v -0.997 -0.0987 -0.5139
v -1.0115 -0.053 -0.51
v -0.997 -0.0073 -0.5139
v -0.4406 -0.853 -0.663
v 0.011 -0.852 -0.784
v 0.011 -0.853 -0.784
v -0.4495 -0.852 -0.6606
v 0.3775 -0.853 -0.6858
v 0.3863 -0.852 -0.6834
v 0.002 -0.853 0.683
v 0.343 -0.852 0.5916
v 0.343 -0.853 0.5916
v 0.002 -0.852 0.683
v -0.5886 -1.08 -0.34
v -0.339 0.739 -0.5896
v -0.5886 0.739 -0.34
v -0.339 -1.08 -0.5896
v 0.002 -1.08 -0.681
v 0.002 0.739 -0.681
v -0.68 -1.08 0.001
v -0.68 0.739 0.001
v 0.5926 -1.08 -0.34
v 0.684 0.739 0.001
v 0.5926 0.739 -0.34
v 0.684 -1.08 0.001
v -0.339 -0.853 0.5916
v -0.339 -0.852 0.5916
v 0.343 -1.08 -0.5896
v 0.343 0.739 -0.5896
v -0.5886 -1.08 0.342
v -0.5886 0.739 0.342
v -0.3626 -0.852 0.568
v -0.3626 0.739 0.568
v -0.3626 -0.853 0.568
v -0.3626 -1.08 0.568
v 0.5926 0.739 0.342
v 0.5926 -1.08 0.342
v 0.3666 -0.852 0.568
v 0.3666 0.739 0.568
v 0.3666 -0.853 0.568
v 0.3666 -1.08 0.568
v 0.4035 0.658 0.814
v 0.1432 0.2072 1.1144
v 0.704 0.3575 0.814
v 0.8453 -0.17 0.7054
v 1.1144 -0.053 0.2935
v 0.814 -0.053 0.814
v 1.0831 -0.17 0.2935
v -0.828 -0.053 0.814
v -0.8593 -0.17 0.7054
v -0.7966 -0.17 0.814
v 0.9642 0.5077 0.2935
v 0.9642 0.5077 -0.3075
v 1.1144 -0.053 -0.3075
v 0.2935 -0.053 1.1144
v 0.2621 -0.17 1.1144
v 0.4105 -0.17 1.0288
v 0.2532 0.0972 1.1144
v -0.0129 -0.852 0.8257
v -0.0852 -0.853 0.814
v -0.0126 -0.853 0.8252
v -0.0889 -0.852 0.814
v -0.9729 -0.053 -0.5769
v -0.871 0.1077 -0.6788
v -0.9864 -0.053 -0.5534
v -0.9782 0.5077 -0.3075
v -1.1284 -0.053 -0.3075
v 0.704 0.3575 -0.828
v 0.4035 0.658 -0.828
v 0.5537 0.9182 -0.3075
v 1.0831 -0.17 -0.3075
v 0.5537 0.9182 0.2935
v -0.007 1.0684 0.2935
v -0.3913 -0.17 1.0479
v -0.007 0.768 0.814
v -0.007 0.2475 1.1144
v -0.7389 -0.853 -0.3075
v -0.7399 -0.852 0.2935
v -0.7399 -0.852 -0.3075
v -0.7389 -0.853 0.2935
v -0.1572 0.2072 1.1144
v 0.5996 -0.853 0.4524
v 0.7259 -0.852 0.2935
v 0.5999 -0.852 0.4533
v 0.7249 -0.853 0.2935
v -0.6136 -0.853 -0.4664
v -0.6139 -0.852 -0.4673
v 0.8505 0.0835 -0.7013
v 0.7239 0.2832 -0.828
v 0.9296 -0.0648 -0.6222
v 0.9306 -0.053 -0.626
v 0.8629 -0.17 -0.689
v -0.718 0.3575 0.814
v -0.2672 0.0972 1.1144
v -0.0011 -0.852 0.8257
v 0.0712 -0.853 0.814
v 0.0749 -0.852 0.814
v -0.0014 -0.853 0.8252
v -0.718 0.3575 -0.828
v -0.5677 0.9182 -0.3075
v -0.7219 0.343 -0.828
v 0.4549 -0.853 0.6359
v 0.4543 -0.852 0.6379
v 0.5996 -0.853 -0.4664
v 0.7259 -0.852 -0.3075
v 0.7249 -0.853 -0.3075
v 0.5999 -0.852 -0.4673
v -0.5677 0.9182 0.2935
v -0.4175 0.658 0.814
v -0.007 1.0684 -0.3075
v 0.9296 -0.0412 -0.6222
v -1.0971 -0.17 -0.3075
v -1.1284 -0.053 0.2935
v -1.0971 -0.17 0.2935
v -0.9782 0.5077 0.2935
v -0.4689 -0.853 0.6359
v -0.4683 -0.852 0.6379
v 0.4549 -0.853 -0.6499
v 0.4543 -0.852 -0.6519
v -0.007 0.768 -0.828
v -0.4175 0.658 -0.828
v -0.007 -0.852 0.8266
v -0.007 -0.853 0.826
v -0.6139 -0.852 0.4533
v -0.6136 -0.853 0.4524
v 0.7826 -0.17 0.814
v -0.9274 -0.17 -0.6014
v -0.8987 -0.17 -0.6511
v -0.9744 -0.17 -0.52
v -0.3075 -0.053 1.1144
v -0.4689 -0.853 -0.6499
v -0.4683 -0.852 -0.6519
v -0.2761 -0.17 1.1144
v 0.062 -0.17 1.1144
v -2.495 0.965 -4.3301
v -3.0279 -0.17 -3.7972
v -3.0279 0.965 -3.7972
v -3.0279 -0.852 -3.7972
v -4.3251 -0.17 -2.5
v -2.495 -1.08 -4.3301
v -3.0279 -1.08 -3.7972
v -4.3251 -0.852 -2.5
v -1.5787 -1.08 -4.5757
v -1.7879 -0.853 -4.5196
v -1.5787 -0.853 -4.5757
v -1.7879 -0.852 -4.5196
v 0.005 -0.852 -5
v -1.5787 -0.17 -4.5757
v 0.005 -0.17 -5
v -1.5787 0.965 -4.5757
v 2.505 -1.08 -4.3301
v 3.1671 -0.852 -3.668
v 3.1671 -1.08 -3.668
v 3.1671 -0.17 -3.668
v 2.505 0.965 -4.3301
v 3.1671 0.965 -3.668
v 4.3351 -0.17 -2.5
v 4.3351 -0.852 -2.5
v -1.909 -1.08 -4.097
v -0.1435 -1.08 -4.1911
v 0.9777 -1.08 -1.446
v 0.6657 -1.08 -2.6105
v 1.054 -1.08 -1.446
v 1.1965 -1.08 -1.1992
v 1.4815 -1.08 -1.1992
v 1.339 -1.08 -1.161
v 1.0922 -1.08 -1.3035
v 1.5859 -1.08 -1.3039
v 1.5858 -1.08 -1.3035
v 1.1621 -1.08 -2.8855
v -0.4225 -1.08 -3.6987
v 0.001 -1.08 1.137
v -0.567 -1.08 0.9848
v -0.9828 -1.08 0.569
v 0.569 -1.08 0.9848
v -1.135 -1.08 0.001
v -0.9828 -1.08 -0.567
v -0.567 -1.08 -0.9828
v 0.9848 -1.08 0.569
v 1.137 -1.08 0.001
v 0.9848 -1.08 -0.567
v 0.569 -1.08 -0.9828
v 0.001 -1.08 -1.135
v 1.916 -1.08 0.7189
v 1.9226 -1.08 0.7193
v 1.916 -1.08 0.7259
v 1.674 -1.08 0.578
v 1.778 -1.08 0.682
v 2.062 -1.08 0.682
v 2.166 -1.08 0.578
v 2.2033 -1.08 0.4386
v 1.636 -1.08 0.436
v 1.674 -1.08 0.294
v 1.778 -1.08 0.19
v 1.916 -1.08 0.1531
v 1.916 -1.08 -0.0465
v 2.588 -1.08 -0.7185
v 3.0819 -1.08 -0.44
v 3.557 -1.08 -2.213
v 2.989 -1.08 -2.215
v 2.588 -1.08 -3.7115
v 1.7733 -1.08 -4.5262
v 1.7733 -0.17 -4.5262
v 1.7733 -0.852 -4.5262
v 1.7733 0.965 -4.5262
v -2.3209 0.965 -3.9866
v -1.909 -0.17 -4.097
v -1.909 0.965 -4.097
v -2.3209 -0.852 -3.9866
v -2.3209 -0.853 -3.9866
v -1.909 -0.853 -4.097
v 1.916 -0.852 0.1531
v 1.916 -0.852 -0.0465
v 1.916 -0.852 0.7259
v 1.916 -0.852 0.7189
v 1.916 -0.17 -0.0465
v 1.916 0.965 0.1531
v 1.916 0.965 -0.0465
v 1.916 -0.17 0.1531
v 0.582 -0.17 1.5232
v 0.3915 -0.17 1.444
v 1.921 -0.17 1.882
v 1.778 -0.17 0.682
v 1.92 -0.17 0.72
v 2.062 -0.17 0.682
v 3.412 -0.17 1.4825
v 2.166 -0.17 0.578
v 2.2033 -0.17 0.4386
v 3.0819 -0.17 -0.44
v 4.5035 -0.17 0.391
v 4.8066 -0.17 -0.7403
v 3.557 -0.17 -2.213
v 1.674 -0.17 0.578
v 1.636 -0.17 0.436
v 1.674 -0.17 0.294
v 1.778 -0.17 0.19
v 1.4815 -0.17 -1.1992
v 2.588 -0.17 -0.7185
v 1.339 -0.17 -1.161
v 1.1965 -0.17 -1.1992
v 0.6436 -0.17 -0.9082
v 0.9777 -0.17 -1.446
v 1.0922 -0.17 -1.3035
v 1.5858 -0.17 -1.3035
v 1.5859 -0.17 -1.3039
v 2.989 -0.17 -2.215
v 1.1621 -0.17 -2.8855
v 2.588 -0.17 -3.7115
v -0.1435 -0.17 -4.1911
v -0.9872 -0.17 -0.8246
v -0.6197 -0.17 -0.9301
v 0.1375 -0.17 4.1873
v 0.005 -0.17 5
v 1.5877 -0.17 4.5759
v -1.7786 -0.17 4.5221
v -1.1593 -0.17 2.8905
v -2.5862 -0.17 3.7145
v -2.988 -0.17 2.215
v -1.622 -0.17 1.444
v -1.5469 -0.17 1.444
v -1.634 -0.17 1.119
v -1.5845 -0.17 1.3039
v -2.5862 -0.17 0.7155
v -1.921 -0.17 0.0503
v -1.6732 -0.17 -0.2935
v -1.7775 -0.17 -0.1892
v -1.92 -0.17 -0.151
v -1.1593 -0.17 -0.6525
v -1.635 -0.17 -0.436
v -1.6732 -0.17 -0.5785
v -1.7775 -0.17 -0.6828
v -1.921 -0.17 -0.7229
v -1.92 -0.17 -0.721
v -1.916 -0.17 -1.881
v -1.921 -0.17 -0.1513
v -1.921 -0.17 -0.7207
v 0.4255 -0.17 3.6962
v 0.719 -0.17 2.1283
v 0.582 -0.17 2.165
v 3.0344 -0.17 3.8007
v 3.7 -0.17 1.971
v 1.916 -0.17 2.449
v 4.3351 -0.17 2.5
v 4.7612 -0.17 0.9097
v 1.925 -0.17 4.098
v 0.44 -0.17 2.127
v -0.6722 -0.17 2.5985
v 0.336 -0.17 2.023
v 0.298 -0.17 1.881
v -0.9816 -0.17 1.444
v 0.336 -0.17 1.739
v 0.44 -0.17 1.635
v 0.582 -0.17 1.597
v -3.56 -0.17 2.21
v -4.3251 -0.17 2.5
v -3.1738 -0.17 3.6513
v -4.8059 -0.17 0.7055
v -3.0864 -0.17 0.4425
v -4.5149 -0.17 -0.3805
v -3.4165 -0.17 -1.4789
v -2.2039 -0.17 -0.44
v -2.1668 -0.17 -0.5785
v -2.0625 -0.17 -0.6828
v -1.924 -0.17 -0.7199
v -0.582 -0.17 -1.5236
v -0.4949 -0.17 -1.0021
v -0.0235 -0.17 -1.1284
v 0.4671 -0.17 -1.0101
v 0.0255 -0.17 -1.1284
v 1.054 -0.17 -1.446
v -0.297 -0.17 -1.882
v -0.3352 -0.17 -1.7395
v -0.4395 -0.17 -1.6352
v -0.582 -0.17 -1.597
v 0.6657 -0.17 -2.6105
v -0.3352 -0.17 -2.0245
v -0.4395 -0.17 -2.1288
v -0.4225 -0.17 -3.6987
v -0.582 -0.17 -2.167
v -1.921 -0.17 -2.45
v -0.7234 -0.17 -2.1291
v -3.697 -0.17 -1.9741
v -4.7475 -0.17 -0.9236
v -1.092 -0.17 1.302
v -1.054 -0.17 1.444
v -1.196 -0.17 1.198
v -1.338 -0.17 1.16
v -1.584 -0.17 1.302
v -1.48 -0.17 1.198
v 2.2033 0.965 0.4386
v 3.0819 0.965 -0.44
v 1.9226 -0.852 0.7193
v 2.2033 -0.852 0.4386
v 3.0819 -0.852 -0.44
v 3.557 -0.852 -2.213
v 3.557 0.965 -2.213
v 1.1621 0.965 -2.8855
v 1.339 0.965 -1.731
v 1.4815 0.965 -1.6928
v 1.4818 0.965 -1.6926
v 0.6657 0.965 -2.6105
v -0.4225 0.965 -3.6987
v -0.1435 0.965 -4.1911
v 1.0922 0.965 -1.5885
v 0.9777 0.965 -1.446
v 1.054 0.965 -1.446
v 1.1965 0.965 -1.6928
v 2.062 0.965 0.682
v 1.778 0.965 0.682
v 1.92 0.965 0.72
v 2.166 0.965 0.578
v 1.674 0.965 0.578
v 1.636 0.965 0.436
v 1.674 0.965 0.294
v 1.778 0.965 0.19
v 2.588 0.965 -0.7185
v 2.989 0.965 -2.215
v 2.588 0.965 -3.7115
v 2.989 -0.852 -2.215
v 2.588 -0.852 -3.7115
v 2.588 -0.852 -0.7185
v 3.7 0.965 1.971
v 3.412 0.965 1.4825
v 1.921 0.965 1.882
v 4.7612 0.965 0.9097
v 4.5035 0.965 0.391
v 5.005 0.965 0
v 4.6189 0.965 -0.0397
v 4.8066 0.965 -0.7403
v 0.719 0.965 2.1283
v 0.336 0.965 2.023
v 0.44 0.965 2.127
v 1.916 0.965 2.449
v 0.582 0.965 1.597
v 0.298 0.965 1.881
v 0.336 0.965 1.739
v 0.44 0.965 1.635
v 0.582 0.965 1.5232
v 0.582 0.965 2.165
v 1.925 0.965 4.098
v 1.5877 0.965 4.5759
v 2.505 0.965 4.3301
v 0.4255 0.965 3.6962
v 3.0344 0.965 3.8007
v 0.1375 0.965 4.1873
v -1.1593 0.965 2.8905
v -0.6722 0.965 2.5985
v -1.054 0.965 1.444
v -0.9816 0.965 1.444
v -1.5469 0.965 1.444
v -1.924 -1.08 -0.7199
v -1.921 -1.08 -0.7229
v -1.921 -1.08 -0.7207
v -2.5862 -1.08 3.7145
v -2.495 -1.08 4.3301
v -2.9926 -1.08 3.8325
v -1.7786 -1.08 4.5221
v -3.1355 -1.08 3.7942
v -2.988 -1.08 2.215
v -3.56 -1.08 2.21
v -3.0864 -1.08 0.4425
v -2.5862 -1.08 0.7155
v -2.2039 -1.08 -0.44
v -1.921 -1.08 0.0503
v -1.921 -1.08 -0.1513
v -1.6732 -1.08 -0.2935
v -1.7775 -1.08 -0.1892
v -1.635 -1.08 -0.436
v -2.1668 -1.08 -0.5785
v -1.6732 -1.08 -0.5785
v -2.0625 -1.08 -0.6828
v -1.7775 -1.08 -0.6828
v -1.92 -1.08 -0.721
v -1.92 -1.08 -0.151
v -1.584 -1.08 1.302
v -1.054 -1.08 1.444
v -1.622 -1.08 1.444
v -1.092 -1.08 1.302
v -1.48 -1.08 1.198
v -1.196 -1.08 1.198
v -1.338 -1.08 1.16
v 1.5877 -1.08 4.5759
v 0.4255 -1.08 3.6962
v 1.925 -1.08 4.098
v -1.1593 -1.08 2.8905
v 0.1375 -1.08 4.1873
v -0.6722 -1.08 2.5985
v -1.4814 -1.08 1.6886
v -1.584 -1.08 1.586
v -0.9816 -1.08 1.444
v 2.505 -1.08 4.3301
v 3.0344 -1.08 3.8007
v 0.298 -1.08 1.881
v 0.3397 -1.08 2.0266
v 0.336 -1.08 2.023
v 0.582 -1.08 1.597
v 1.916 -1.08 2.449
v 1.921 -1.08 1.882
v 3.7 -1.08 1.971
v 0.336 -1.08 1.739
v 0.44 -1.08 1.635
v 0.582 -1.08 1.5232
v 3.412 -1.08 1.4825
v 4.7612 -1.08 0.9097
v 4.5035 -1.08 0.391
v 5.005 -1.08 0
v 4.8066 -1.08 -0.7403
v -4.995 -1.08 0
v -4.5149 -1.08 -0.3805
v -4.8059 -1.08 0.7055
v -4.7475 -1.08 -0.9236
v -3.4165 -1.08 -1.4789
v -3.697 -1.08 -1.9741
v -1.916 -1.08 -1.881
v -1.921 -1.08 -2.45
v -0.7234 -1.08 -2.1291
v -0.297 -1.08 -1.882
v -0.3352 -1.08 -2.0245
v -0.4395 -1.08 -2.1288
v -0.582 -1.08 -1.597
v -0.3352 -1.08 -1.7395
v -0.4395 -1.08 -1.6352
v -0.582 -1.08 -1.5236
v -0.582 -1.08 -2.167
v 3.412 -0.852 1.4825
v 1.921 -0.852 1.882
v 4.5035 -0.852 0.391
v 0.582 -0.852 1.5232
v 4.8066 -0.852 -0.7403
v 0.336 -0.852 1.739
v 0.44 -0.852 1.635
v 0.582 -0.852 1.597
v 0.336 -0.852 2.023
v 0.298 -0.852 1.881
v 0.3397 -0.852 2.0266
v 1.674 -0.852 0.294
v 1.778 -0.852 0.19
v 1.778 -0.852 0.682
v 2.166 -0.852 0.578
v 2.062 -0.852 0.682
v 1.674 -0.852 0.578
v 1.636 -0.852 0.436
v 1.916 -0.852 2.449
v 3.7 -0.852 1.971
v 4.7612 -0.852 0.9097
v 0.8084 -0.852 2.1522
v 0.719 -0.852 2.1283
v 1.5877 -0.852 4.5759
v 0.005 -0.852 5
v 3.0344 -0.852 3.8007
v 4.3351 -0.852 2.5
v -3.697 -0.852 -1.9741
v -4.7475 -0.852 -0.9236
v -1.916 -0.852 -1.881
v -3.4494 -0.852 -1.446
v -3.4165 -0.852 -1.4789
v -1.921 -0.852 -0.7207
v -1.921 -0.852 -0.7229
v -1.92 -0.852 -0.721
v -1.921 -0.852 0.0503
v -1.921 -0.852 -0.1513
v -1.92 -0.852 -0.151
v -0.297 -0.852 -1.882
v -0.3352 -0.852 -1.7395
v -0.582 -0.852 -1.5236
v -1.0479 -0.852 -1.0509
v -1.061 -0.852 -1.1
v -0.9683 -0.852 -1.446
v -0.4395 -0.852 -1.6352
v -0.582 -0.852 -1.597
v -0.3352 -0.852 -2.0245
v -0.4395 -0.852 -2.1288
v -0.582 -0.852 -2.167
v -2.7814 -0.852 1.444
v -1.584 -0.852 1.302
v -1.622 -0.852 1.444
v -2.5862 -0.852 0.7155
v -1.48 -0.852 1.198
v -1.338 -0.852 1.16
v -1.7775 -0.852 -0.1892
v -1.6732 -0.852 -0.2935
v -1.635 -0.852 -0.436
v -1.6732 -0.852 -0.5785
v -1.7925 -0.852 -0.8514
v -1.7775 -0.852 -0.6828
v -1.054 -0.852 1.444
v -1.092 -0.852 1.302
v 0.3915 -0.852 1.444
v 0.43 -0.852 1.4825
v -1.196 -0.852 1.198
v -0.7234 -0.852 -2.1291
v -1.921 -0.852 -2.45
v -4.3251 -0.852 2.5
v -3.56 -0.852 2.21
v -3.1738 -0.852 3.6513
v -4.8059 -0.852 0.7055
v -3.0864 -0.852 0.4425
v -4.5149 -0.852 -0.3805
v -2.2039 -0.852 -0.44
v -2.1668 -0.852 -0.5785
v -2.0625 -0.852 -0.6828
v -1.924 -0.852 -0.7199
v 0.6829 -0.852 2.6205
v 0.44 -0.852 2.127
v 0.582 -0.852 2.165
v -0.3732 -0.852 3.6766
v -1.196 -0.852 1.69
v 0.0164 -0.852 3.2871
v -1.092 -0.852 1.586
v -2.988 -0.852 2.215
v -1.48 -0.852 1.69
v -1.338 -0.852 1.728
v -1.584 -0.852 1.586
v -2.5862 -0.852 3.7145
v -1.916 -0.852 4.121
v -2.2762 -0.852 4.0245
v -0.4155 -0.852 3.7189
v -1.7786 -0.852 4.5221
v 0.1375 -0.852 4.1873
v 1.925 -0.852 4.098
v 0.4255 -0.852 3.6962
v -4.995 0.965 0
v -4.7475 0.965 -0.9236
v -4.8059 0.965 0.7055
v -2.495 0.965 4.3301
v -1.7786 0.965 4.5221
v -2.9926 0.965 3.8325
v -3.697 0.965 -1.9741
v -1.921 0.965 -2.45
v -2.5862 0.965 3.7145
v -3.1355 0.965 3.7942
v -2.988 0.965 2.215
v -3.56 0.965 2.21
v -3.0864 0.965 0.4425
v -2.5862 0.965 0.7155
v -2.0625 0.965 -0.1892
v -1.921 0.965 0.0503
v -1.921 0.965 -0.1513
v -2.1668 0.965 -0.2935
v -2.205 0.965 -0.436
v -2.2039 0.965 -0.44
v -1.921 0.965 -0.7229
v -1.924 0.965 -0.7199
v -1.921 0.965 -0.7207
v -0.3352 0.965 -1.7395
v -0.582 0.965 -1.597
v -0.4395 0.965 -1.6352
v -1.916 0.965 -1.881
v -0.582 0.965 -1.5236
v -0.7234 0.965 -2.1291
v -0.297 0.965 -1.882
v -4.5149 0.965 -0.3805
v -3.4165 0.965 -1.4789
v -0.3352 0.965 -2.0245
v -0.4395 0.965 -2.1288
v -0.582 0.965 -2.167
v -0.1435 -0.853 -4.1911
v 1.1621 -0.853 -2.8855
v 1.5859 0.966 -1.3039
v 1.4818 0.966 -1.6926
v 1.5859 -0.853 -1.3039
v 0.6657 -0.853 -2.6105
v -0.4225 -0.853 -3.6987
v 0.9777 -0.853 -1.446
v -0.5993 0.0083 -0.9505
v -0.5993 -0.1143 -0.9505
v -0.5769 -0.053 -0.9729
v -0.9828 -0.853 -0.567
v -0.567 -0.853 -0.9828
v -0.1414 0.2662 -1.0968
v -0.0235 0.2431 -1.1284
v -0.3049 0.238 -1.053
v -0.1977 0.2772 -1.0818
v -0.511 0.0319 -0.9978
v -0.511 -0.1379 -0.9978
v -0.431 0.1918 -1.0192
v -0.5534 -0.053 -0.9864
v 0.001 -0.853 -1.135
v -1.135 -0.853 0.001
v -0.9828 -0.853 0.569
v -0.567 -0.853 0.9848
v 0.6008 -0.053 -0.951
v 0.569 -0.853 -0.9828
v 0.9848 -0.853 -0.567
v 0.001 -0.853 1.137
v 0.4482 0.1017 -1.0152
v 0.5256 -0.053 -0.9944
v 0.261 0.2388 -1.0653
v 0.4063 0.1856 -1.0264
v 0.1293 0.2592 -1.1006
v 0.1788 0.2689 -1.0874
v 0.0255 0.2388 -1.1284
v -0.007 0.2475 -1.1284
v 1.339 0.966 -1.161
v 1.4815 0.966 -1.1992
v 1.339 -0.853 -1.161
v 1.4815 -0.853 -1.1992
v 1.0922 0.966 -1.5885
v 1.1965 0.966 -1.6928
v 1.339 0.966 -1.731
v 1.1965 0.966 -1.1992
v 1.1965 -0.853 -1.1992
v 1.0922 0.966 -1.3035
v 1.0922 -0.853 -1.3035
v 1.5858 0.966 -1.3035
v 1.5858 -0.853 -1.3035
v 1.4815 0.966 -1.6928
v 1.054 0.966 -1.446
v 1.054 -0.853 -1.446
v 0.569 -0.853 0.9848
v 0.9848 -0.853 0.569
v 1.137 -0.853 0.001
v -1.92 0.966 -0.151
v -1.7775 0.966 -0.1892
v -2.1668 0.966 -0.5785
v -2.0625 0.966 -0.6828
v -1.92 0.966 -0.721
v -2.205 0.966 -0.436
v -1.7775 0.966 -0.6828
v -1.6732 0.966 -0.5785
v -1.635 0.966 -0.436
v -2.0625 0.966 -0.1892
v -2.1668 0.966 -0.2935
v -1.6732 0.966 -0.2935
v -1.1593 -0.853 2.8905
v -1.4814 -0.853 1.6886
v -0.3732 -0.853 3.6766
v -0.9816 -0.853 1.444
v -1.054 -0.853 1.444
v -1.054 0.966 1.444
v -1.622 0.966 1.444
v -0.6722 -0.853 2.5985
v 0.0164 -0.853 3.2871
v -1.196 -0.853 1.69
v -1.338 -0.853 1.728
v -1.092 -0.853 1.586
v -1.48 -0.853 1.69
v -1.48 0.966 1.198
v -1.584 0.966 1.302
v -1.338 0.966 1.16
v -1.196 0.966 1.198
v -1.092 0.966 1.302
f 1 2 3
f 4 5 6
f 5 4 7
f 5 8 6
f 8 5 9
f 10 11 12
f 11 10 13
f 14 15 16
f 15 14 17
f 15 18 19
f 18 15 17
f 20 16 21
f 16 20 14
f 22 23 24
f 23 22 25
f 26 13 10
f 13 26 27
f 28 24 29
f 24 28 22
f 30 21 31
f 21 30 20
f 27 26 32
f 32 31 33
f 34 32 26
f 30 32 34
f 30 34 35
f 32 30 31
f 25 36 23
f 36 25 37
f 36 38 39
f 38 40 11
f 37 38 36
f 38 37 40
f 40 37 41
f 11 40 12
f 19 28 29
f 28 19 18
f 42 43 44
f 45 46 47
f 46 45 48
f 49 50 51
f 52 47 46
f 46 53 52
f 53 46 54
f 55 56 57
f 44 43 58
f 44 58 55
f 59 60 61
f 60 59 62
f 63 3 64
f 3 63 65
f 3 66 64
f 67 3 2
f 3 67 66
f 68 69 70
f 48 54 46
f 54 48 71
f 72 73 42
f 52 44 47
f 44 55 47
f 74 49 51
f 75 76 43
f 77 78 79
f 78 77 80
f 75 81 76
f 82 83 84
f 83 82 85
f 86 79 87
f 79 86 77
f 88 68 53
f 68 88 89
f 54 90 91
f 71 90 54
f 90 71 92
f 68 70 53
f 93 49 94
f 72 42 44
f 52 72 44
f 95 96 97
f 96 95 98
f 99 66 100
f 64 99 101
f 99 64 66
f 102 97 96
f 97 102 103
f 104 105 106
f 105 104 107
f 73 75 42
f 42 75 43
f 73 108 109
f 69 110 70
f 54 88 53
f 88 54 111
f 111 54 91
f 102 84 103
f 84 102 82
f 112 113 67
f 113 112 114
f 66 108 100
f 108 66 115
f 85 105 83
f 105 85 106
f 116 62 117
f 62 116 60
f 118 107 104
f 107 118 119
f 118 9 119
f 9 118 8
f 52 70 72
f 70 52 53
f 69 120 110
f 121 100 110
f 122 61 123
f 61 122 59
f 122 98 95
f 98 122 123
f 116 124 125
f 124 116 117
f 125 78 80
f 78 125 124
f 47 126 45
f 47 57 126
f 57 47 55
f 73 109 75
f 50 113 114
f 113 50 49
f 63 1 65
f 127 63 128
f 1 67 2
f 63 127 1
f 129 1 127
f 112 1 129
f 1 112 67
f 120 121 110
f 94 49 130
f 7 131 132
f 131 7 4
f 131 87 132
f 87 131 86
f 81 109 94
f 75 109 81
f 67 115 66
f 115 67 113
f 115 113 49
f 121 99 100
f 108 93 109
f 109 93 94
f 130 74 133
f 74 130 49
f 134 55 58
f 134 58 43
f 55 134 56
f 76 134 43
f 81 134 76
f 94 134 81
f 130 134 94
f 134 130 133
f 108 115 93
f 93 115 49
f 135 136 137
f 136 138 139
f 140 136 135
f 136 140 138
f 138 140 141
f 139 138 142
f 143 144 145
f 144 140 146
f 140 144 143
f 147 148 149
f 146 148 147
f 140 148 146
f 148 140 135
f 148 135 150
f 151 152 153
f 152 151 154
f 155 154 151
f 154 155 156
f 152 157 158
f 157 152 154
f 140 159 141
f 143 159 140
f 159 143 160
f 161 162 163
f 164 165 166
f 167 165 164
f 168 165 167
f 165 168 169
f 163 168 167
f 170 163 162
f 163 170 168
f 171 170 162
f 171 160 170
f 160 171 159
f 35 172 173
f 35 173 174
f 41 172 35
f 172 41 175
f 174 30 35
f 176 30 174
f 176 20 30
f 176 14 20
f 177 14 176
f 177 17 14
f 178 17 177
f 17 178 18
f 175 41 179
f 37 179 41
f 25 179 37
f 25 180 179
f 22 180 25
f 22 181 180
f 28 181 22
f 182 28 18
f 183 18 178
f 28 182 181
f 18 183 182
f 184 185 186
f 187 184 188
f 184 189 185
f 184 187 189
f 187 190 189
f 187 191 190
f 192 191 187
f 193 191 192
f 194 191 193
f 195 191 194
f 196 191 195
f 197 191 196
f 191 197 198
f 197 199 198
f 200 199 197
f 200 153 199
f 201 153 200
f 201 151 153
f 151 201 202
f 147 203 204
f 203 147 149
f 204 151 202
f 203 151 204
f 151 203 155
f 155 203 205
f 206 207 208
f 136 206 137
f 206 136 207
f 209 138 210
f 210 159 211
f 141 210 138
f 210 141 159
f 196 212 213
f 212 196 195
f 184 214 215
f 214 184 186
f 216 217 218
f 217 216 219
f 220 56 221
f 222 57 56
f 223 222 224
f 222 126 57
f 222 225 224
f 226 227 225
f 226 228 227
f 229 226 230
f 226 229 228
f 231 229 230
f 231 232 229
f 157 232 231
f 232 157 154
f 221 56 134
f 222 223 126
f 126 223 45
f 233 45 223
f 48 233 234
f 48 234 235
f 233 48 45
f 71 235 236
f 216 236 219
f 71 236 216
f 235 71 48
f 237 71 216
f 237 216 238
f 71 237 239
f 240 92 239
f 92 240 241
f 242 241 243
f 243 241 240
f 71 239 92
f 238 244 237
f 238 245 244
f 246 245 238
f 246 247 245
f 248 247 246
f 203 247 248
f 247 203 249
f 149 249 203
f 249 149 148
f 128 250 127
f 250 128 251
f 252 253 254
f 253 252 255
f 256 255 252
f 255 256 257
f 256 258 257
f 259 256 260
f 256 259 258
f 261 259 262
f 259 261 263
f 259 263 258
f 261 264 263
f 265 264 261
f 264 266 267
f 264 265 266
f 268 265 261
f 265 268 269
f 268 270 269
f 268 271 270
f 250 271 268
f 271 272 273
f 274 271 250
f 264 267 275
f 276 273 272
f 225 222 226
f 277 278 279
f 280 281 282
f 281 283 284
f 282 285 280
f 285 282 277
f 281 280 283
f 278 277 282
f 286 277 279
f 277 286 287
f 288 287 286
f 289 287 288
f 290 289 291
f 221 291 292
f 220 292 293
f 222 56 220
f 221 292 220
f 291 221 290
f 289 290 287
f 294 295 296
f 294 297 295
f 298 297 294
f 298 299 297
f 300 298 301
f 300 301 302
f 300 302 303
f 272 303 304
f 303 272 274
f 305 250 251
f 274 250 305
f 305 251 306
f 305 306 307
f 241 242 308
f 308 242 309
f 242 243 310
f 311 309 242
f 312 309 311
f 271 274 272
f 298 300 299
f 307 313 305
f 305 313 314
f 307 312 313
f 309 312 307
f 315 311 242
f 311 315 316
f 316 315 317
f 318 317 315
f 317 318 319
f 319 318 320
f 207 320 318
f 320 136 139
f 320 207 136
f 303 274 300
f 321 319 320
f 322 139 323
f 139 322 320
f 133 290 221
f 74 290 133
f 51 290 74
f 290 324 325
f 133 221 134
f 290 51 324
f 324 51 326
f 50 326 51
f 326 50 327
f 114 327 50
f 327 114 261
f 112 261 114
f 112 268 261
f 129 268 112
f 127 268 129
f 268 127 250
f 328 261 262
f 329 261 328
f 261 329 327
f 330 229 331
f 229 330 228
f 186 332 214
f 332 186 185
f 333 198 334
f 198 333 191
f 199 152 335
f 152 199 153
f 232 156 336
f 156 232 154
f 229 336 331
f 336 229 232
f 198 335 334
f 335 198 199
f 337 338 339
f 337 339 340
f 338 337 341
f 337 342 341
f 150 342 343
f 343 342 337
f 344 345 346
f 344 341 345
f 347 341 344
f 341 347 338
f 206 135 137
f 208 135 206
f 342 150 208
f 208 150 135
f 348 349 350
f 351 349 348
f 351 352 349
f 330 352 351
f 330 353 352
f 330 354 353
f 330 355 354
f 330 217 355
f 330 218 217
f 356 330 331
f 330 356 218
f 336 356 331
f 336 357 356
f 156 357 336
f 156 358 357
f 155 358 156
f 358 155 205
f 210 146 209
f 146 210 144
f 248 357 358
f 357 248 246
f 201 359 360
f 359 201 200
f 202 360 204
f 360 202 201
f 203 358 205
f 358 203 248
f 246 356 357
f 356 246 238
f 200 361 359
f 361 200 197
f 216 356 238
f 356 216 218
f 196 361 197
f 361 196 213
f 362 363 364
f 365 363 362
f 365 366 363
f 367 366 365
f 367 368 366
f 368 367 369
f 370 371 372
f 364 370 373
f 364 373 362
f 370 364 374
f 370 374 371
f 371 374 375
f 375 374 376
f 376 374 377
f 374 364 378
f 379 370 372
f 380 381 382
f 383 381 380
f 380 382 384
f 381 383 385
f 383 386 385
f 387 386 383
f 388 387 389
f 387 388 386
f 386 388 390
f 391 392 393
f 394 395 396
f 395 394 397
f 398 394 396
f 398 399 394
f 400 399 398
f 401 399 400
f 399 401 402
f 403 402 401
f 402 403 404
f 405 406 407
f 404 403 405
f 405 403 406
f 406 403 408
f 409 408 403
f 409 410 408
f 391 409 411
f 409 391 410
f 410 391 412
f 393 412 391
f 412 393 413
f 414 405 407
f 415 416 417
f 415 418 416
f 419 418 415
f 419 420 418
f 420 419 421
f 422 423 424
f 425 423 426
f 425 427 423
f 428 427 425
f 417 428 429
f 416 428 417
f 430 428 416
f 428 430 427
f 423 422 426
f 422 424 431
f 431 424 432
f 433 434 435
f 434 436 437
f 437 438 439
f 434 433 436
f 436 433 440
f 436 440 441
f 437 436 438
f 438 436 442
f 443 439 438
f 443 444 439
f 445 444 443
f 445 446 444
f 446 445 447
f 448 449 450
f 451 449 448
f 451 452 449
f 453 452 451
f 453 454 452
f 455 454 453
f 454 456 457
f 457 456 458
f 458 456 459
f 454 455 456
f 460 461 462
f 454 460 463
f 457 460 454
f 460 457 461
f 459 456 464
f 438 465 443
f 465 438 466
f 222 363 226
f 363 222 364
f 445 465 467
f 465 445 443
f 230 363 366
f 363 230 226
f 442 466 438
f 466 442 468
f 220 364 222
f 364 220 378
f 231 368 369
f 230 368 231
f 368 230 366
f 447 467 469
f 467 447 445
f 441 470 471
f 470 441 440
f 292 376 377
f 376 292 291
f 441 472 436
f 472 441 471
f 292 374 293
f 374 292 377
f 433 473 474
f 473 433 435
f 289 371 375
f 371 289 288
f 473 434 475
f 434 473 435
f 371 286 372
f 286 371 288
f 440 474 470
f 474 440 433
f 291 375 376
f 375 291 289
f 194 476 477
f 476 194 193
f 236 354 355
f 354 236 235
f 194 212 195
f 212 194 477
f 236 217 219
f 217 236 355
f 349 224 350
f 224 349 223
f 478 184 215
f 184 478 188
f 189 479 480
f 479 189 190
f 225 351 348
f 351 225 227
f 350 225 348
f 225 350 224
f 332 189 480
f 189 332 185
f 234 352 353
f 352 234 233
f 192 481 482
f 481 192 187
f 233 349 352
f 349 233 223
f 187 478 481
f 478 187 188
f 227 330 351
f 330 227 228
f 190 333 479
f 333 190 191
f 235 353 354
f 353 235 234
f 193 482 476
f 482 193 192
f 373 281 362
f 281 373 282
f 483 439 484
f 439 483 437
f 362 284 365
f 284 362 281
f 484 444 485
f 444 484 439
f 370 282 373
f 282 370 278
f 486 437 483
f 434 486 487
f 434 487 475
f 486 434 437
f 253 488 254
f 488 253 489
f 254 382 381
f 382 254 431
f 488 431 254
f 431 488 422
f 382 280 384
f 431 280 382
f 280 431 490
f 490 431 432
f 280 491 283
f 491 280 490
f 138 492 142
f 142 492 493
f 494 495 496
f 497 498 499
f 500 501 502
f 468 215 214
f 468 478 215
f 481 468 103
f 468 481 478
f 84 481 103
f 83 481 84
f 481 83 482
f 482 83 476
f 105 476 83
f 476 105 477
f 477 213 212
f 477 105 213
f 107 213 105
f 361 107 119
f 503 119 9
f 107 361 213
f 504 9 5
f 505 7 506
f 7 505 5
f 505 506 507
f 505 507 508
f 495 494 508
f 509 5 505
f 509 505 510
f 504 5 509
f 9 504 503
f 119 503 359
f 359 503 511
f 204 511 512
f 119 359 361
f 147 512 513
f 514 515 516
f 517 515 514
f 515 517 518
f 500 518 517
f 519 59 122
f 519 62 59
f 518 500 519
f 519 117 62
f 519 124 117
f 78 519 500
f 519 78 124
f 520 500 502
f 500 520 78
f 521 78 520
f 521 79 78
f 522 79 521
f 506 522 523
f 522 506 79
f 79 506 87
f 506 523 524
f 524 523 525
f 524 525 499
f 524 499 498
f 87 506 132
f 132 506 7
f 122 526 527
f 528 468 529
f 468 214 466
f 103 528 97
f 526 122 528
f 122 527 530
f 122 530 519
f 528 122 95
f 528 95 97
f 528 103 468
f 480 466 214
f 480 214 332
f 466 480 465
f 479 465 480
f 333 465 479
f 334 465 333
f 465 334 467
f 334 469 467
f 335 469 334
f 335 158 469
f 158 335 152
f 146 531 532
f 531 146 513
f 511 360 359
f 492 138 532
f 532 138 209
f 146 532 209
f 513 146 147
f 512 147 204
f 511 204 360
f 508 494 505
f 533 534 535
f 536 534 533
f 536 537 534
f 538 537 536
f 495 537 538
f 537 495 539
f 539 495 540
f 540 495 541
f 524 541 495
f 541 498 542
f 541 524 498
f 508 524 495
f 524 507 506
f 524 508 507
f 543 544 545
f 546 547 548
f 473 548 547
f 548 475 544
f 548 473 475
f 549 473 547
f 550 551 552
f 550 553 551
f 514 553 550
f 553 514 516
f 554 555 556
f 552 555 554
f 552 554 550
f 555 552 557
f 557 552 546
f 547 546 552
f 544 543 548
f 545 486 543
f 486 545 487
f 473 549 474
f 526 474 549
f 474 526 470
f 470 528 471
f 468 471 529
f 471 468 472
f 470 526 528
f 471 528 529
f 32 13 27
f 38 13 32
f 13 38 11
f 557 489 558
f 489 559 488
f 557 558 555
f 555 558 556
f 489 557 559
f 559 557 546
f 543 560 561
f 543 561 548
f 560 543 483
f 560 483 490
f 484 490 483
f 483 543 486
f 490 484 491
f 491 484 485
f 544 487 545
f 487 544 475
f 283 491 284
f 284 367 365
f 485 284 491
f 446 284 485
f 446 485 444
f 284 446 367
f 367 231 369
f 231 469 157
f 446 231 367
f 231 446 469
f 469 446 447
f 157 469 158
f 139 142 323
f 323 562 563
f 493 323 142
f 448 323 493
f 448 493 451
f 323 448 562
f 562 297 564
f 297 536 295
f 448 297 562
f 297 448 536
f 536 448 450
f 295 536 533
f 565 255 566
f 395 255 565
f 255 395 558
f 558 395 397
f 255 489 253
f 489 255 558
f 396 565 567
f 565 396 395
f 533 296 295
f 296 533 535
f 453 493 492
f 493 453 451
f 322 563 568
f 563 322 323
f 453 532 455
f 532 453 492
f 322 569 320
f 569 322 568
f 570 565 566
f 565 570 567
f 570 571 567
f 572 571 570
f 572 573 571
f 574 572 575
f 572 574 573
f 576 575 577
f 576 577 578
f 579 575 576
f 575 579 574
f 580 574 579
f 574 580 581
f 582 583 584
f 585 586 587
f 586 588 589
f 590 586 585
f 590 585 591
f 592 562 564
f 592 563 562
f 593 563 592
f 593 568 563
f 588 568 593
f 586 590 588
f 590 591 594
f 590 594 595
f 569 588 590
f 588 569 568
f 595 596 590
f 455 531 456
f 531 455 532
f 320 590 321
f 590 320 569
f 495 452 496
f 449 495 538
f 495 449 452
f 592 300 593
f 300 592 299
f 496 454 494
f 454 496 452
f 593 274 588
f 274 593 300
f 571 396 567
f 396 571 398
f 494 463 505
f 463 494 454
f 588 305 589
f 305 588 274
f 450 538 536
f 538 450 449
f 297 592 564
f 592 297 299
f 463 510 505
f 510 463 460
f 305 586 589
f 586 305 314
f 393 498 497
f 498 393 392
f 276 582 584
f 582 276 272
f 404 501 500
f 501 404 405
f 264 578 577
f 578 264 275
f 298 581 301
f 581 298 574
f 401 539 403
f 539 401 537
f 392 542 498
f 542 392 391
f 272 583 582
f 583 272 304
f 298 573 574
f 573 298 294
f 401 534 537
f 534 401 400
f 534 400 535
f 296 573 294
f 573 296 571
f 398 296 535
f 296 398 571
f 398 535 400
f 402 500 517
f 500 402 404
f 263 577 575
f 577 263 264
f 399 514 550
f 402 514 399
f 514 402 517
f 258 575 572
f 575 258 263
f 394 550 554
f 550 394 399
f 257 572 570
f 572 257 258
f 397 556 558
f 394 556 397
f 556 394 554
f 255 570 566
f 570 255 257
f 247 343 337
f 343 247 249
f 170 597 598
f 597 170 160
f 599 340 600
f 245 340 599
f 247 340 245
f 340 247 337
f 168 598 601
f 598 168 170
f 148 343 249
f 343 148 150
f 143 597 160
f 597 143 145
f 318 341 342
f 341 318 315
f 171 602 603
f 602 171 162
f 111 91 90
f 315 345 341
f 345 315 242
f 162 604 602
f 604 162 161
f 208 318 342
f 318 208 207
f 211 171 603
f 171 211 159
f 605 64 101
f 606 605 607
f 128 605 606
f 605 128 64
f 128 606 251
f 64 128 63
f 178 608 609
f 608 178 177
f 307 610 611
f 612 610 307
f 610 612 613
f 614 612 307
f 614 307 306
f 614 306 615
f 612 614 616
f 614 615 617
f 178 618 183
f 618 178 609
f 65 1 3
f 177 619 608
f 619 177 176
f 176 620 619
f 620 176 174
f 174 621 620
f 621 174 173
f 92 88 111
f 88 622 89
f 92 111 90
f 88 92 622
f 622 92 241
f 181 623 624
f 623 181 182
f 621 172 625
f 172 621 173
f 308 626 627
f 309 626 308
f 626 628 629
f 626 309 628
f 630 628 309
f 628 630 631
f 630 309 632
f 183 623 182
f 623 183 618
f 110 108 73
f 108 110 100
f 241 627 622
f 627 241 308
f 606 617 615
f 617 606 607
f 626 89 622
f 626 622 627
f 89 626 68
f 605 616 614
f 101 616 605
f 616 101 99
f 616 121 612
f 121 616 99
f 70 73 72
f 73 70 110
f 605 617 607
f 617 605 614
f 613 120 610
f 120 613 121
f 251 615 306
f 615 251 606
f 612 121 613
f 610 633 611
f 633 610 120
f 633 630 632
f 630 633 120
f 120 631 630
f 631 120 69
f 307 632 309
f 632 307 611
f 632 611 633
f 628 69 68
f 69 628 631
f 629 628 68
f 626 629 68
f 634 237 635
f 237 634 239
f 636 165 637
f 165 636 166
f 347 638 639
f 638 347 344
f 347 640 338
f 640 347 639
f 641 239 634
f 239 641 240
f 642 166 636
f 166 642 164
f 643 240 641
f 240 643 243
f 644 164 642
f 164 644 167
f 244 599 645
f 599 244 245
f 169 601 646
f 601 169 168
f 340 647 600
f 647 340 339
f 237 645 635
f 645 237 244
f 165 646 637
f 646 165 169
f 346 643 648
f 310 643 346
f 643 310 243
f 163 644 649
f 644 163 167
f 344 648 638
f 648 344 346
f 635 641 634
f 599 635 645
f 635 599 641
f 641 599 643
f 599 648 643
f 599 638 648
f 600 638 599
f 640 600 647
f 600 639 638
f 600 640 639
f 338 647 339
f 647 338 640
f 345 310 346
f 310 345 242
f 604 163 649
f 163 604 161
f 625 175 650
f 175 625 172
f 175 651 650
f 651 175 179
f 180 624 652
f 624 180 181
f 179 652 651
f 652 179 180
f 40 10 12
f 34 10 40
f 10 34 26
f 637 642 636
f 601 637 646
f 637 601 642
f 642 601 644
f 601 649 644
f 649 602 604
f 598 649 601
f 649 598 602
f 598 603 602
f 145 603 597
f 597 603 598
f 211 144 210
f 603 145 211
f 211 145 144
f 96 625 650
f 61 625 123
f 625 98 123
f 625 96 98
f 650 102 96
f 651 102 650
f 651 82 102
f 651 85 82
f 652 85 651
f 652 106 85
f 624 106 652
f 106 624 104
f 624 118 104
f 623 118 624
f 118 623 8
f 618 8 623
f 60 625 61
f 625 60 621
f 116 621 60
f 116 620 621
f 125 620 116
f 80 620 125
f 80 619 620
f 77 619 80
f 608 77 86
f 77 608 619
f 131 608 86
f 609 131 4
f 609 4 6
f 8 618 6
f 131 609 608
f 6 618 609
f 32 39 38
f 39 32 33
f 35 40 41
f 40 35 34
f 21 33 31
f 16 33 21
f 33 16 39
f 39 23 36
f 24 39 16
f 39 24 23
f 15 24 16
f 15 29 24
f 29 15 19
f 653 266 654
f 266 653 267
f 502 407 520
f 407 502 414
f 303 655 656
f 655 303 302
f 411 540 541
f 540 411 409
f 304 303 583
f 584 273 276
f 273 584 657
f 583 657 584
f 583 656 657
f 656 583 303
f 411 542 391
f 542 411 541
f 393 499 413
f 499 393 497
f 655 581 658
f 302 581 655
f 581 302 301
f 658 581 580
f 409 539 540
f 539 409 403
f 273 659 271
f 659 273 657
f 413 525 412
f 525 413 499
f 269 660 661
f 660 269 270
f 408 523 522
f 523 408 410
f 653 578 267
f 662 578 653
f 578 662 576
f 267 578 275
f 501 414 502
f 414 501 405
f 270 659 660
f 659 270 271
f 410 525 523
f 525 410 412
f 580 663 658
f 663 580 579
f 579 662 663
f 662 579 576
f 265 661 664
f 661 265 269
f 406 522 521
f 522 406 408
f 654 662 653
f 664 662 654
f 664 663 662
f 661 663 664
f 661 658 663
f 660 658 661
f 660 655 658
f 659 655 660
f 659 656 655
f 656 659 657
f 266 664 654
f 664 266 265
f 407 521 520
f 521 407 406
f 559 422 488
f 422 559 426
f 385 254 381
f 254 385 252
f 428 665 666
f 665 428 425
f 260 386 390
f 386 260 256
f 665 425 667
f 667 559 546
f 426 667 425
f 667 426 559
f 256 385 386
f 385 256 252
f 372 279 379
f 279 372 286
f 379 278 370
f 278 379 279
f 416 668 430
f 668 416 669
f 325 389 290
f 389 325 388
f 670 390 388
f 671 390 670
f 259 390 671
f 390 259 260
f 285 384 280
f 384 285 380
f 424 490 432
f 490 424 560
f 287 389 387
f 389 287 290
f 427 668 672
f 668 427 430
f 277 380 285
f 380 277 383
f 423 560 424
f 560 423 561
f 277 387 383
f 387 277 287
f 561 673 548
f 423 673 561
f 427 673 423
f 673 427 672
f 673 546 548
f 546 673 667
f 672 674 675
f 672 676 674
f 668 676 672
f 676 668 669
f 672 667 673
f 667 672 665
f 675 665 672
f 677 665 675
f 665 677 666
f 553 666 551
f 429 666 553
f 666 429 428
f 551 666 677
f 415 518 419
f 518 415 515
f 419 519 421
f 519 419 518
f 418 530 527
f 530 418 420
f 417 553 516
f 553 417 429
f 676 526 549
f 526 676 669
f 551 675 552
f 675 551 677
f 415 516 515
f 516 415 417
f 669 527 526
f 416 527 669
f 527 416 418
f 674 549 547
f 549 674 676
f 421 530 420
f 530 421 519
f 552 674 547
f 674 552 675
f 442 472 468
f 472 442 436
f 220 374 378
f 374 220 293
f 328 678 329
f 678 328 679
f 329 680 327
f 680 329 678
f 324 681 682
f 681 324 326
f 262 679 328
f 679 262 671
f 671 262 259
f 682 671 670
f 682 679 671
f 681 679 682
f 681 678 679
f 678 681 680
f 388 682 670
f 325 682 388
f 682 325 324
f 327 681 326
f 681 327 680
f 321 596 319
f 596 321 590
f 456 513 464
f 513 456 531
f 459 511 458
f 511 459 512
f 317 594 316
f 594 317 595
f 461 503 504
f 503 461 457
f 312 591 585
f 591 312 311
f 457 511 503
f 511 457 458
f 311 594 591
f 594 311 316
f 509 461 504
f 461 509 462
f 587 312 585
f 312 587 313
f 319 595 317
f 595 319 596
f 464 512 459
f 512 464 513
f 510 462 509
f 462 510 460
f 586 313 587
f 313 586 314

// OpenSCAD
intersection() {
translate([-6, -1.295, -6]) cube(size = [12, 2.591, 12], center = false);
union() {
intersection() {
difference() {
rotate([180, 90, -90])
translate([-2.215, -0.011, -18.1])
cylinder(h = 36.2, r1 = 2.999, r2 = 2.999, center = false, $fn = 12);
rotate([180, 90, -90])
translate([-0.001, -0.002, -18.1])
cylinder(h = 36.2, r1 = 0.682, r2 = 0.682, center = false, $fn = 12);
}
difference() {
translate([-0.007, -0.053, -0.007]) sphere(r = 1.161, $fn = 12);
rotate([180, 90, -90])
translate([-0.001, -0.002, -18.1])
cylinder(h = 36.2, r1 = 0.682, r2 = 0.682, center = false, $fn = 12);
}
}
difference() {
difference() {
difference() {
rotate([180, 90, -90])
translate([0, -0.005, -1.08])
cylinder(h = 19.18, r1 = 5, r2 = 5, center = false, $fn = 12);
rotate([180, 90, -90])
translate([1.124, 1.909, -18.1])
cylinder(h = 19.066, r1 = 2.973, r2 = 2.973, center = false, $fn = 12);
}
union() {
translate([-18.1, -18.1, -1.446]) cube(size = [20.016, 19.066, 19.546], center = false);
translate([1.916, -0.17, 0.568]) cube(size = [16.184, 18.271, 17.532], center = false);
}
}
difference() {
rotate([180, 90, -90])
translate([0, -0.005, -1.08])
cylinder(h = 19.18, r1 = 5, r2 = 5, center = false, $fn = 12);
difference() {
rotate([180, 90, -90])
translate([2.213, -0.011, -1.08])
cylinder(h = 2.045, r1 = 3.546, r2 = 3.546, center = false, $fn = 12);
rotate([180, 90, -90])
translate([2.215, 0.004, -1.08])
cylinder(h = 2.045, r1 = 2.993, r2 = 2.993, center = false, $fn = 12);
}
}
}
rotate([180, 90, -90])
translate([1.882, 0.582, -1.08])
cylinder(h = 2.045, r1 = 0.285, r2 = 0.285, center = false, $fn = 12);
intersection() {
union() {
difference() {
translate([1.916, -1.08, -1.446]) cube(size = [16.184, 2.045, 19.546], center = false);
rotate([180, 90, -90])
translate([1.1, -1.921, -1.08])
cylinder(h = 19.18, r1 = 2.982, r2 = 2.982, center = false, $fn = 12);
}
rotate([180, 90, -90])
translate([-1.881, -0.582, -1.08])
cylinder(h = 1.818, r1 = 0.284, r2 = 0.284, center = false, $fn = 12);
rotate([180, 90, -90])
translate([-0.436, -1.92, -1.08])
cylinder(h = 2.045, r1 = 0.284, r2 = 0.284, center = false, $fn = 12);
}
difference() {
union() {
rotate([180, 90, -90])
translate([1.119, -1.916, -18.1])
cylinder(h = 36.2, r1 = 3.568, r2 = 3.568, center = false, $fn = 12);
rotate([180, 90, -90])
translate([0, -0.005, -0.852])
cylinder(h = 0.682, r1 = 5, r2 = 5, center = false, $fn = 12);
}
difference() {
translate([1.916, -1.08, -1.446]) cube(size = [16.184, 2.045, 19.546], center = false);
rotate([180, 90, -90])
translate([0, -0.005, -1.08])
cylinder(h = 2.045, r1 = 5, r2 = 5, center = false, $fn = 12);
}
}
}
difference() {
union() {
difference() {
intersection() {
rotate([180, 90, -90])
translate([0, -0.005, -1.08])
cylinder(h = 19.18, r1 = 5, r2 = 5, center = false, $fn = 12);
rotate([180, 90, -90])
translate([-1.102, 1.921, -1.08])
cylinder(h = 2.045, r1 = 3.552, r2 = 3.552, center = false, $fn = 12);
}
union() {
rotate([180, 90, -90])
translate([-1.12, 1.916, -1.08])
cylinder(h = 19.18, r1 = 3.001, r2 = 3.001, center = false, $fn = 12);
translate([-0.582, -1.08, -18.1]) cube(size = [18.682, 19.18, 36.2], center = false);
}
}
intersection() {
rotate([180, 90, -90])
translate([-1.12, 1.916, -18.1])
cylinder(h = 36.2, r1 = 3.001, r2 = 3.001, center = false, $fn = 12);
translate([-18.1, -18.1, -18.1]) cube(size = [16.179, 36.2, 36.2], center = false);
rotate([180, 90, -90])
translate([-2.21, 0.025, -1.08])
cylinder(h = 2.045, r1 = 3.535, r2 = 3.535, center = false, $fn = 12);
}
}
rotate([180, 90, -90])
translate([-2.215, -0.011, -18.1])
cylinder(h = 36.2, r1 = 2.999, r2 = 2.999, center = false, $fn = 12);
}
intersection() {
union() {
rotate([180, 90, -90])
translate([0, -0.005, -0.852])
cylinder(h = 0.682, r1 = 5, r2 = 5, center = false, $fn = 12);
rotate([180, 90, -90])
translate([-0.001, -0.001, -18.1])
cylinder(h = 19.066, r1 = 1.136, r2 = 1.136, center = false, $fn = 12);
difference() {
rotate([180, 90, -90])
translate([1.102, 1.927, -18.1])
cylinder(h = 36.2, r1 = 3.567, r2 = 3.567, center = false, $fn = 12);
rotate([180, 90, -90])
translate([1.124, 1.909, -18.1])
cylinder(h = 19.066, r1 = 2.973, r2 = 2.973, center = false, $fn = 12);
}
}
union() {
difference() {
translate([-0.007, -0.053, -0.007]) sphere(r = 1.161, $fn = 12);
translate([-18.1, -18.1, -1.446]) cube(size = [20.016, 17.93, 2.014], center = false);
}
rotate([180, 90, -90])
translate([1.1, -1.921, -0.852])
cylinder(h = 0.682, r1 = 2.982, r2 = 2.982, center = false, $fn = 12);
rotate([180, 90, -90])
translate([1.446, -1.339, -18.1])
cylinder(h = 19.066, r1 = 0.285, r2 = 0.285, center = false, $fn = 12);
translate([-18.1, -1.08, -18.1]) cube(size = [20.016, 2.045, 16.654], center = false);
rotate([180, 90, -90])
translate([-0.001, -0.001, -18.1])
cylinder(h = 17.248, r1 = 1.136, r2 = 1.136, center = false, $fn = 12);
}
difference() {
union() {
rotate([180, 90, -90])
translate([0, -0.005, -1.08])
cylinder(h = 0.227, r1 = 5, r2 = 5, center = false, $fn = 12);
rotate([180, 90, -90])
translate([0, -0.005, -0.852])
cylinder(h = 18.952, r1 = 5, r2 = 5, center = false, $fn = 12);
}
intersection() {
translate([-18.1, -18.1, -1.446]) cube(size = [20.016, 18.839, 2.014], center = false);
rotate([180, 90, -90])
translate([-0.001, -0.002, -18.1])
cylinder(h = 36.2, r1 = 0.682, r2 = 0.682, center = false, $fn = 12);
}
}
}
intersection() {
union() {
rotate([180, 90, -90])
translate([0.436, 1.92, -18.1])
cylinder(h = 19.066, r1 = 0.285, r2 = 0.285, center = false, $fn = 12);
translate([-0.007, -0.053, -0.007]) sphere(r = 1.161, $fn = 12);
}
union() {
rotate([180, 90, -90])
translate([0, -0.005, 0.966])
cylinder(h = 17.134, r1 = 5, r2 = 5, center = false, $fn = 12);
rotate([180, 90, -90])
translate([0.436, 1.92, -1.08])
cylinder(h = 19.18, r1 = 0.285, r2 = 0.285, center = false, $fn = 12);
}
}
difference() {
difference() {
union() {
translate([-18.1, -0.852, -18.1]) cube(size = [36.2, 0.682, 36.2], center = false);
intersection() {
rotate([180, 90, -90])
translate([-1.102, 1.921, -18.1])
cylinder(h = 17.93, r1 = 3.552, r2 = 3.552, center = false, $fn = 12);
translate([-18.1, -1.08, -18.1]) cube(size = [36.2, 0.227, 19.544], center = false);
}
rotate([180, 90, -90])
translate([-1.119, -1.909, -1.08])
cylinder(h = 19.18, r1 = 3.543, r2 = 3.543, center = false, $fn = 12);
}
difference() {
rotate([180, 90, -90])
translate([-1.099, -1.925, -18.1])
cylinder(h = 36.2, r1 = 2.999, r2 = 2.999, center = false, $fn = 12);
union() {
rotate([180, 90, -90])
translate([-1.881, -0.582, -0.17])
cylinder(h = 1.136, r1 = 0.284, r2 = 0.284, center = false, $fn = 12);
translate([-18.1, -0.852, 1.444]) cube(size = [36.2, 0.682, 16.656], center = false);
}
}
}
union() {
difference() {
translate([-18.1, -1.08, -18.1]) cube(size = [36.2, 19.18, 36.2], center = false);
rotate([180, 90, -90])
translate([0, -0.005, -1.08])
cylinder(h = 2.045, r1 = 5, r2 = 5, center = false, $fn = 12);
}
intersection() {
translate([-18.1, -1.08, -18.1]) cube(size = [18.682, 2.045, 19.544], center = false);
rotate([180, 90, -90])
translate([-1.119, -1.909, -18.1])
cylinder(h = 19.066, r1 = 3.543, r2 = 3.543, center = false, $fn = 12);
}
rotate([180, 90, -90])
translate([1.1, -1.921, -1.08])
cylinder(h = 19.18, r1 = 2.982, r2 = 2.982, center = false, $fn = 12);
difference() {
rotate([180, 90, -90])
translate([-1.12, 1.916, -18.1])
cylinder(h = 17.248, r1 = 3.001, r2 = 3.001, center = false, $fn = 12);
rotate([180, 90, -90])
translate([-1.119, -1.909, -1.08])
cylinder(h = 0.227, r1 = 3.543, r2 = 3.543, center = false, $fn = 12);
}
}
}
difference() {
difference() {
intersection() {
rotate([180, 90, -90])
translate([0, -0.005, -1.08])
cylinder(h = 19.18, r1 = 5, r2 = 5, center = false, $fn = 12);
rotate([180, 90, -90])
translate([-2.21, 0.025, -1.08])
cylinder(h = 2.045, r1 = 3.535, r2 = 3.535, center = false, $fn = 12);
}
difference() {
rotate([180, 90, -90])
translate([-2.215, -0.011, -18.1])
cylinder(h = 17.248, r1 = 2.999, r2 = 2.999, center = false, $fn = 12);
rotate([180, 90, -90])
translate([-1.444, 1.338, -18.1])
cylinder(h = 17.248, r1 = 0.284, r2 = 0.284, center = false, $fn = 12);
}
}
union() {
rotate([180, 90, -90])
translate([2.213, -0.011, -1.08])
cylinder(h = 19.18, r1 = 3.546, r2 = 3.546, center = false, $fn = 12);
rotate([180, 90, -90])
translate([-2.215, -0.011, -0.17])
cylinder(h = 18.271, r1 = 2.999, r2 = 2.999, center = false, $fn = 12);
difference() {
translate([0.582, -18.1, -18.1]) cube(size = [17.518, 19.066, 36.2], center = false);
rotate([180, 90, -90])
translate([0, -0.005, -0.852])
cylinder(h = 0.682, r1 = 5, r2 = 5, center = false, $fn = 12);
}
}
}
difference() {
union() {
difference() {
rotate([180, 90, -90])
translate([-2.21, 0.025, -0.852])
cylinder(h = 18.952, r1 = 3.535, r2 = 3.535, center = false, $fn = 12);
translate([-18.1, -0.852, 1.444]) cube(size = [36.2, 18.952, 16.656], center = false);
}
intersection() {
rotate([180, 90, -90])
translate([1.119, -1.916, -1.08])
cylinder(h = 2.045, r1 = 3.568, r2 = 3.568, center = false, $fn = 12);
translate([0.582, -1.08, 1.444]) cube(size = [17.518, 19.18, 16.656], center = false);
}
}
union() {
difference() {
translate([-18.1, -0.17, -18.1]) cube(size = [36.2, 18.271, 19.544], center = false);
rotate([180, 90, -90])
translate([-1.444, 1.338, -0.17])
cylinder(h = 1.136, r1 = 0.284, r2 = 0.284, center = false, $fn = 12);
}
rotate([180, 90, -90])
translate([1.1, -1.921, -18.1])
cylinder(h = 36.2, r1 = 2.982, r2 = 2.982, center = false, $fn = 12);
}
}
}
}
